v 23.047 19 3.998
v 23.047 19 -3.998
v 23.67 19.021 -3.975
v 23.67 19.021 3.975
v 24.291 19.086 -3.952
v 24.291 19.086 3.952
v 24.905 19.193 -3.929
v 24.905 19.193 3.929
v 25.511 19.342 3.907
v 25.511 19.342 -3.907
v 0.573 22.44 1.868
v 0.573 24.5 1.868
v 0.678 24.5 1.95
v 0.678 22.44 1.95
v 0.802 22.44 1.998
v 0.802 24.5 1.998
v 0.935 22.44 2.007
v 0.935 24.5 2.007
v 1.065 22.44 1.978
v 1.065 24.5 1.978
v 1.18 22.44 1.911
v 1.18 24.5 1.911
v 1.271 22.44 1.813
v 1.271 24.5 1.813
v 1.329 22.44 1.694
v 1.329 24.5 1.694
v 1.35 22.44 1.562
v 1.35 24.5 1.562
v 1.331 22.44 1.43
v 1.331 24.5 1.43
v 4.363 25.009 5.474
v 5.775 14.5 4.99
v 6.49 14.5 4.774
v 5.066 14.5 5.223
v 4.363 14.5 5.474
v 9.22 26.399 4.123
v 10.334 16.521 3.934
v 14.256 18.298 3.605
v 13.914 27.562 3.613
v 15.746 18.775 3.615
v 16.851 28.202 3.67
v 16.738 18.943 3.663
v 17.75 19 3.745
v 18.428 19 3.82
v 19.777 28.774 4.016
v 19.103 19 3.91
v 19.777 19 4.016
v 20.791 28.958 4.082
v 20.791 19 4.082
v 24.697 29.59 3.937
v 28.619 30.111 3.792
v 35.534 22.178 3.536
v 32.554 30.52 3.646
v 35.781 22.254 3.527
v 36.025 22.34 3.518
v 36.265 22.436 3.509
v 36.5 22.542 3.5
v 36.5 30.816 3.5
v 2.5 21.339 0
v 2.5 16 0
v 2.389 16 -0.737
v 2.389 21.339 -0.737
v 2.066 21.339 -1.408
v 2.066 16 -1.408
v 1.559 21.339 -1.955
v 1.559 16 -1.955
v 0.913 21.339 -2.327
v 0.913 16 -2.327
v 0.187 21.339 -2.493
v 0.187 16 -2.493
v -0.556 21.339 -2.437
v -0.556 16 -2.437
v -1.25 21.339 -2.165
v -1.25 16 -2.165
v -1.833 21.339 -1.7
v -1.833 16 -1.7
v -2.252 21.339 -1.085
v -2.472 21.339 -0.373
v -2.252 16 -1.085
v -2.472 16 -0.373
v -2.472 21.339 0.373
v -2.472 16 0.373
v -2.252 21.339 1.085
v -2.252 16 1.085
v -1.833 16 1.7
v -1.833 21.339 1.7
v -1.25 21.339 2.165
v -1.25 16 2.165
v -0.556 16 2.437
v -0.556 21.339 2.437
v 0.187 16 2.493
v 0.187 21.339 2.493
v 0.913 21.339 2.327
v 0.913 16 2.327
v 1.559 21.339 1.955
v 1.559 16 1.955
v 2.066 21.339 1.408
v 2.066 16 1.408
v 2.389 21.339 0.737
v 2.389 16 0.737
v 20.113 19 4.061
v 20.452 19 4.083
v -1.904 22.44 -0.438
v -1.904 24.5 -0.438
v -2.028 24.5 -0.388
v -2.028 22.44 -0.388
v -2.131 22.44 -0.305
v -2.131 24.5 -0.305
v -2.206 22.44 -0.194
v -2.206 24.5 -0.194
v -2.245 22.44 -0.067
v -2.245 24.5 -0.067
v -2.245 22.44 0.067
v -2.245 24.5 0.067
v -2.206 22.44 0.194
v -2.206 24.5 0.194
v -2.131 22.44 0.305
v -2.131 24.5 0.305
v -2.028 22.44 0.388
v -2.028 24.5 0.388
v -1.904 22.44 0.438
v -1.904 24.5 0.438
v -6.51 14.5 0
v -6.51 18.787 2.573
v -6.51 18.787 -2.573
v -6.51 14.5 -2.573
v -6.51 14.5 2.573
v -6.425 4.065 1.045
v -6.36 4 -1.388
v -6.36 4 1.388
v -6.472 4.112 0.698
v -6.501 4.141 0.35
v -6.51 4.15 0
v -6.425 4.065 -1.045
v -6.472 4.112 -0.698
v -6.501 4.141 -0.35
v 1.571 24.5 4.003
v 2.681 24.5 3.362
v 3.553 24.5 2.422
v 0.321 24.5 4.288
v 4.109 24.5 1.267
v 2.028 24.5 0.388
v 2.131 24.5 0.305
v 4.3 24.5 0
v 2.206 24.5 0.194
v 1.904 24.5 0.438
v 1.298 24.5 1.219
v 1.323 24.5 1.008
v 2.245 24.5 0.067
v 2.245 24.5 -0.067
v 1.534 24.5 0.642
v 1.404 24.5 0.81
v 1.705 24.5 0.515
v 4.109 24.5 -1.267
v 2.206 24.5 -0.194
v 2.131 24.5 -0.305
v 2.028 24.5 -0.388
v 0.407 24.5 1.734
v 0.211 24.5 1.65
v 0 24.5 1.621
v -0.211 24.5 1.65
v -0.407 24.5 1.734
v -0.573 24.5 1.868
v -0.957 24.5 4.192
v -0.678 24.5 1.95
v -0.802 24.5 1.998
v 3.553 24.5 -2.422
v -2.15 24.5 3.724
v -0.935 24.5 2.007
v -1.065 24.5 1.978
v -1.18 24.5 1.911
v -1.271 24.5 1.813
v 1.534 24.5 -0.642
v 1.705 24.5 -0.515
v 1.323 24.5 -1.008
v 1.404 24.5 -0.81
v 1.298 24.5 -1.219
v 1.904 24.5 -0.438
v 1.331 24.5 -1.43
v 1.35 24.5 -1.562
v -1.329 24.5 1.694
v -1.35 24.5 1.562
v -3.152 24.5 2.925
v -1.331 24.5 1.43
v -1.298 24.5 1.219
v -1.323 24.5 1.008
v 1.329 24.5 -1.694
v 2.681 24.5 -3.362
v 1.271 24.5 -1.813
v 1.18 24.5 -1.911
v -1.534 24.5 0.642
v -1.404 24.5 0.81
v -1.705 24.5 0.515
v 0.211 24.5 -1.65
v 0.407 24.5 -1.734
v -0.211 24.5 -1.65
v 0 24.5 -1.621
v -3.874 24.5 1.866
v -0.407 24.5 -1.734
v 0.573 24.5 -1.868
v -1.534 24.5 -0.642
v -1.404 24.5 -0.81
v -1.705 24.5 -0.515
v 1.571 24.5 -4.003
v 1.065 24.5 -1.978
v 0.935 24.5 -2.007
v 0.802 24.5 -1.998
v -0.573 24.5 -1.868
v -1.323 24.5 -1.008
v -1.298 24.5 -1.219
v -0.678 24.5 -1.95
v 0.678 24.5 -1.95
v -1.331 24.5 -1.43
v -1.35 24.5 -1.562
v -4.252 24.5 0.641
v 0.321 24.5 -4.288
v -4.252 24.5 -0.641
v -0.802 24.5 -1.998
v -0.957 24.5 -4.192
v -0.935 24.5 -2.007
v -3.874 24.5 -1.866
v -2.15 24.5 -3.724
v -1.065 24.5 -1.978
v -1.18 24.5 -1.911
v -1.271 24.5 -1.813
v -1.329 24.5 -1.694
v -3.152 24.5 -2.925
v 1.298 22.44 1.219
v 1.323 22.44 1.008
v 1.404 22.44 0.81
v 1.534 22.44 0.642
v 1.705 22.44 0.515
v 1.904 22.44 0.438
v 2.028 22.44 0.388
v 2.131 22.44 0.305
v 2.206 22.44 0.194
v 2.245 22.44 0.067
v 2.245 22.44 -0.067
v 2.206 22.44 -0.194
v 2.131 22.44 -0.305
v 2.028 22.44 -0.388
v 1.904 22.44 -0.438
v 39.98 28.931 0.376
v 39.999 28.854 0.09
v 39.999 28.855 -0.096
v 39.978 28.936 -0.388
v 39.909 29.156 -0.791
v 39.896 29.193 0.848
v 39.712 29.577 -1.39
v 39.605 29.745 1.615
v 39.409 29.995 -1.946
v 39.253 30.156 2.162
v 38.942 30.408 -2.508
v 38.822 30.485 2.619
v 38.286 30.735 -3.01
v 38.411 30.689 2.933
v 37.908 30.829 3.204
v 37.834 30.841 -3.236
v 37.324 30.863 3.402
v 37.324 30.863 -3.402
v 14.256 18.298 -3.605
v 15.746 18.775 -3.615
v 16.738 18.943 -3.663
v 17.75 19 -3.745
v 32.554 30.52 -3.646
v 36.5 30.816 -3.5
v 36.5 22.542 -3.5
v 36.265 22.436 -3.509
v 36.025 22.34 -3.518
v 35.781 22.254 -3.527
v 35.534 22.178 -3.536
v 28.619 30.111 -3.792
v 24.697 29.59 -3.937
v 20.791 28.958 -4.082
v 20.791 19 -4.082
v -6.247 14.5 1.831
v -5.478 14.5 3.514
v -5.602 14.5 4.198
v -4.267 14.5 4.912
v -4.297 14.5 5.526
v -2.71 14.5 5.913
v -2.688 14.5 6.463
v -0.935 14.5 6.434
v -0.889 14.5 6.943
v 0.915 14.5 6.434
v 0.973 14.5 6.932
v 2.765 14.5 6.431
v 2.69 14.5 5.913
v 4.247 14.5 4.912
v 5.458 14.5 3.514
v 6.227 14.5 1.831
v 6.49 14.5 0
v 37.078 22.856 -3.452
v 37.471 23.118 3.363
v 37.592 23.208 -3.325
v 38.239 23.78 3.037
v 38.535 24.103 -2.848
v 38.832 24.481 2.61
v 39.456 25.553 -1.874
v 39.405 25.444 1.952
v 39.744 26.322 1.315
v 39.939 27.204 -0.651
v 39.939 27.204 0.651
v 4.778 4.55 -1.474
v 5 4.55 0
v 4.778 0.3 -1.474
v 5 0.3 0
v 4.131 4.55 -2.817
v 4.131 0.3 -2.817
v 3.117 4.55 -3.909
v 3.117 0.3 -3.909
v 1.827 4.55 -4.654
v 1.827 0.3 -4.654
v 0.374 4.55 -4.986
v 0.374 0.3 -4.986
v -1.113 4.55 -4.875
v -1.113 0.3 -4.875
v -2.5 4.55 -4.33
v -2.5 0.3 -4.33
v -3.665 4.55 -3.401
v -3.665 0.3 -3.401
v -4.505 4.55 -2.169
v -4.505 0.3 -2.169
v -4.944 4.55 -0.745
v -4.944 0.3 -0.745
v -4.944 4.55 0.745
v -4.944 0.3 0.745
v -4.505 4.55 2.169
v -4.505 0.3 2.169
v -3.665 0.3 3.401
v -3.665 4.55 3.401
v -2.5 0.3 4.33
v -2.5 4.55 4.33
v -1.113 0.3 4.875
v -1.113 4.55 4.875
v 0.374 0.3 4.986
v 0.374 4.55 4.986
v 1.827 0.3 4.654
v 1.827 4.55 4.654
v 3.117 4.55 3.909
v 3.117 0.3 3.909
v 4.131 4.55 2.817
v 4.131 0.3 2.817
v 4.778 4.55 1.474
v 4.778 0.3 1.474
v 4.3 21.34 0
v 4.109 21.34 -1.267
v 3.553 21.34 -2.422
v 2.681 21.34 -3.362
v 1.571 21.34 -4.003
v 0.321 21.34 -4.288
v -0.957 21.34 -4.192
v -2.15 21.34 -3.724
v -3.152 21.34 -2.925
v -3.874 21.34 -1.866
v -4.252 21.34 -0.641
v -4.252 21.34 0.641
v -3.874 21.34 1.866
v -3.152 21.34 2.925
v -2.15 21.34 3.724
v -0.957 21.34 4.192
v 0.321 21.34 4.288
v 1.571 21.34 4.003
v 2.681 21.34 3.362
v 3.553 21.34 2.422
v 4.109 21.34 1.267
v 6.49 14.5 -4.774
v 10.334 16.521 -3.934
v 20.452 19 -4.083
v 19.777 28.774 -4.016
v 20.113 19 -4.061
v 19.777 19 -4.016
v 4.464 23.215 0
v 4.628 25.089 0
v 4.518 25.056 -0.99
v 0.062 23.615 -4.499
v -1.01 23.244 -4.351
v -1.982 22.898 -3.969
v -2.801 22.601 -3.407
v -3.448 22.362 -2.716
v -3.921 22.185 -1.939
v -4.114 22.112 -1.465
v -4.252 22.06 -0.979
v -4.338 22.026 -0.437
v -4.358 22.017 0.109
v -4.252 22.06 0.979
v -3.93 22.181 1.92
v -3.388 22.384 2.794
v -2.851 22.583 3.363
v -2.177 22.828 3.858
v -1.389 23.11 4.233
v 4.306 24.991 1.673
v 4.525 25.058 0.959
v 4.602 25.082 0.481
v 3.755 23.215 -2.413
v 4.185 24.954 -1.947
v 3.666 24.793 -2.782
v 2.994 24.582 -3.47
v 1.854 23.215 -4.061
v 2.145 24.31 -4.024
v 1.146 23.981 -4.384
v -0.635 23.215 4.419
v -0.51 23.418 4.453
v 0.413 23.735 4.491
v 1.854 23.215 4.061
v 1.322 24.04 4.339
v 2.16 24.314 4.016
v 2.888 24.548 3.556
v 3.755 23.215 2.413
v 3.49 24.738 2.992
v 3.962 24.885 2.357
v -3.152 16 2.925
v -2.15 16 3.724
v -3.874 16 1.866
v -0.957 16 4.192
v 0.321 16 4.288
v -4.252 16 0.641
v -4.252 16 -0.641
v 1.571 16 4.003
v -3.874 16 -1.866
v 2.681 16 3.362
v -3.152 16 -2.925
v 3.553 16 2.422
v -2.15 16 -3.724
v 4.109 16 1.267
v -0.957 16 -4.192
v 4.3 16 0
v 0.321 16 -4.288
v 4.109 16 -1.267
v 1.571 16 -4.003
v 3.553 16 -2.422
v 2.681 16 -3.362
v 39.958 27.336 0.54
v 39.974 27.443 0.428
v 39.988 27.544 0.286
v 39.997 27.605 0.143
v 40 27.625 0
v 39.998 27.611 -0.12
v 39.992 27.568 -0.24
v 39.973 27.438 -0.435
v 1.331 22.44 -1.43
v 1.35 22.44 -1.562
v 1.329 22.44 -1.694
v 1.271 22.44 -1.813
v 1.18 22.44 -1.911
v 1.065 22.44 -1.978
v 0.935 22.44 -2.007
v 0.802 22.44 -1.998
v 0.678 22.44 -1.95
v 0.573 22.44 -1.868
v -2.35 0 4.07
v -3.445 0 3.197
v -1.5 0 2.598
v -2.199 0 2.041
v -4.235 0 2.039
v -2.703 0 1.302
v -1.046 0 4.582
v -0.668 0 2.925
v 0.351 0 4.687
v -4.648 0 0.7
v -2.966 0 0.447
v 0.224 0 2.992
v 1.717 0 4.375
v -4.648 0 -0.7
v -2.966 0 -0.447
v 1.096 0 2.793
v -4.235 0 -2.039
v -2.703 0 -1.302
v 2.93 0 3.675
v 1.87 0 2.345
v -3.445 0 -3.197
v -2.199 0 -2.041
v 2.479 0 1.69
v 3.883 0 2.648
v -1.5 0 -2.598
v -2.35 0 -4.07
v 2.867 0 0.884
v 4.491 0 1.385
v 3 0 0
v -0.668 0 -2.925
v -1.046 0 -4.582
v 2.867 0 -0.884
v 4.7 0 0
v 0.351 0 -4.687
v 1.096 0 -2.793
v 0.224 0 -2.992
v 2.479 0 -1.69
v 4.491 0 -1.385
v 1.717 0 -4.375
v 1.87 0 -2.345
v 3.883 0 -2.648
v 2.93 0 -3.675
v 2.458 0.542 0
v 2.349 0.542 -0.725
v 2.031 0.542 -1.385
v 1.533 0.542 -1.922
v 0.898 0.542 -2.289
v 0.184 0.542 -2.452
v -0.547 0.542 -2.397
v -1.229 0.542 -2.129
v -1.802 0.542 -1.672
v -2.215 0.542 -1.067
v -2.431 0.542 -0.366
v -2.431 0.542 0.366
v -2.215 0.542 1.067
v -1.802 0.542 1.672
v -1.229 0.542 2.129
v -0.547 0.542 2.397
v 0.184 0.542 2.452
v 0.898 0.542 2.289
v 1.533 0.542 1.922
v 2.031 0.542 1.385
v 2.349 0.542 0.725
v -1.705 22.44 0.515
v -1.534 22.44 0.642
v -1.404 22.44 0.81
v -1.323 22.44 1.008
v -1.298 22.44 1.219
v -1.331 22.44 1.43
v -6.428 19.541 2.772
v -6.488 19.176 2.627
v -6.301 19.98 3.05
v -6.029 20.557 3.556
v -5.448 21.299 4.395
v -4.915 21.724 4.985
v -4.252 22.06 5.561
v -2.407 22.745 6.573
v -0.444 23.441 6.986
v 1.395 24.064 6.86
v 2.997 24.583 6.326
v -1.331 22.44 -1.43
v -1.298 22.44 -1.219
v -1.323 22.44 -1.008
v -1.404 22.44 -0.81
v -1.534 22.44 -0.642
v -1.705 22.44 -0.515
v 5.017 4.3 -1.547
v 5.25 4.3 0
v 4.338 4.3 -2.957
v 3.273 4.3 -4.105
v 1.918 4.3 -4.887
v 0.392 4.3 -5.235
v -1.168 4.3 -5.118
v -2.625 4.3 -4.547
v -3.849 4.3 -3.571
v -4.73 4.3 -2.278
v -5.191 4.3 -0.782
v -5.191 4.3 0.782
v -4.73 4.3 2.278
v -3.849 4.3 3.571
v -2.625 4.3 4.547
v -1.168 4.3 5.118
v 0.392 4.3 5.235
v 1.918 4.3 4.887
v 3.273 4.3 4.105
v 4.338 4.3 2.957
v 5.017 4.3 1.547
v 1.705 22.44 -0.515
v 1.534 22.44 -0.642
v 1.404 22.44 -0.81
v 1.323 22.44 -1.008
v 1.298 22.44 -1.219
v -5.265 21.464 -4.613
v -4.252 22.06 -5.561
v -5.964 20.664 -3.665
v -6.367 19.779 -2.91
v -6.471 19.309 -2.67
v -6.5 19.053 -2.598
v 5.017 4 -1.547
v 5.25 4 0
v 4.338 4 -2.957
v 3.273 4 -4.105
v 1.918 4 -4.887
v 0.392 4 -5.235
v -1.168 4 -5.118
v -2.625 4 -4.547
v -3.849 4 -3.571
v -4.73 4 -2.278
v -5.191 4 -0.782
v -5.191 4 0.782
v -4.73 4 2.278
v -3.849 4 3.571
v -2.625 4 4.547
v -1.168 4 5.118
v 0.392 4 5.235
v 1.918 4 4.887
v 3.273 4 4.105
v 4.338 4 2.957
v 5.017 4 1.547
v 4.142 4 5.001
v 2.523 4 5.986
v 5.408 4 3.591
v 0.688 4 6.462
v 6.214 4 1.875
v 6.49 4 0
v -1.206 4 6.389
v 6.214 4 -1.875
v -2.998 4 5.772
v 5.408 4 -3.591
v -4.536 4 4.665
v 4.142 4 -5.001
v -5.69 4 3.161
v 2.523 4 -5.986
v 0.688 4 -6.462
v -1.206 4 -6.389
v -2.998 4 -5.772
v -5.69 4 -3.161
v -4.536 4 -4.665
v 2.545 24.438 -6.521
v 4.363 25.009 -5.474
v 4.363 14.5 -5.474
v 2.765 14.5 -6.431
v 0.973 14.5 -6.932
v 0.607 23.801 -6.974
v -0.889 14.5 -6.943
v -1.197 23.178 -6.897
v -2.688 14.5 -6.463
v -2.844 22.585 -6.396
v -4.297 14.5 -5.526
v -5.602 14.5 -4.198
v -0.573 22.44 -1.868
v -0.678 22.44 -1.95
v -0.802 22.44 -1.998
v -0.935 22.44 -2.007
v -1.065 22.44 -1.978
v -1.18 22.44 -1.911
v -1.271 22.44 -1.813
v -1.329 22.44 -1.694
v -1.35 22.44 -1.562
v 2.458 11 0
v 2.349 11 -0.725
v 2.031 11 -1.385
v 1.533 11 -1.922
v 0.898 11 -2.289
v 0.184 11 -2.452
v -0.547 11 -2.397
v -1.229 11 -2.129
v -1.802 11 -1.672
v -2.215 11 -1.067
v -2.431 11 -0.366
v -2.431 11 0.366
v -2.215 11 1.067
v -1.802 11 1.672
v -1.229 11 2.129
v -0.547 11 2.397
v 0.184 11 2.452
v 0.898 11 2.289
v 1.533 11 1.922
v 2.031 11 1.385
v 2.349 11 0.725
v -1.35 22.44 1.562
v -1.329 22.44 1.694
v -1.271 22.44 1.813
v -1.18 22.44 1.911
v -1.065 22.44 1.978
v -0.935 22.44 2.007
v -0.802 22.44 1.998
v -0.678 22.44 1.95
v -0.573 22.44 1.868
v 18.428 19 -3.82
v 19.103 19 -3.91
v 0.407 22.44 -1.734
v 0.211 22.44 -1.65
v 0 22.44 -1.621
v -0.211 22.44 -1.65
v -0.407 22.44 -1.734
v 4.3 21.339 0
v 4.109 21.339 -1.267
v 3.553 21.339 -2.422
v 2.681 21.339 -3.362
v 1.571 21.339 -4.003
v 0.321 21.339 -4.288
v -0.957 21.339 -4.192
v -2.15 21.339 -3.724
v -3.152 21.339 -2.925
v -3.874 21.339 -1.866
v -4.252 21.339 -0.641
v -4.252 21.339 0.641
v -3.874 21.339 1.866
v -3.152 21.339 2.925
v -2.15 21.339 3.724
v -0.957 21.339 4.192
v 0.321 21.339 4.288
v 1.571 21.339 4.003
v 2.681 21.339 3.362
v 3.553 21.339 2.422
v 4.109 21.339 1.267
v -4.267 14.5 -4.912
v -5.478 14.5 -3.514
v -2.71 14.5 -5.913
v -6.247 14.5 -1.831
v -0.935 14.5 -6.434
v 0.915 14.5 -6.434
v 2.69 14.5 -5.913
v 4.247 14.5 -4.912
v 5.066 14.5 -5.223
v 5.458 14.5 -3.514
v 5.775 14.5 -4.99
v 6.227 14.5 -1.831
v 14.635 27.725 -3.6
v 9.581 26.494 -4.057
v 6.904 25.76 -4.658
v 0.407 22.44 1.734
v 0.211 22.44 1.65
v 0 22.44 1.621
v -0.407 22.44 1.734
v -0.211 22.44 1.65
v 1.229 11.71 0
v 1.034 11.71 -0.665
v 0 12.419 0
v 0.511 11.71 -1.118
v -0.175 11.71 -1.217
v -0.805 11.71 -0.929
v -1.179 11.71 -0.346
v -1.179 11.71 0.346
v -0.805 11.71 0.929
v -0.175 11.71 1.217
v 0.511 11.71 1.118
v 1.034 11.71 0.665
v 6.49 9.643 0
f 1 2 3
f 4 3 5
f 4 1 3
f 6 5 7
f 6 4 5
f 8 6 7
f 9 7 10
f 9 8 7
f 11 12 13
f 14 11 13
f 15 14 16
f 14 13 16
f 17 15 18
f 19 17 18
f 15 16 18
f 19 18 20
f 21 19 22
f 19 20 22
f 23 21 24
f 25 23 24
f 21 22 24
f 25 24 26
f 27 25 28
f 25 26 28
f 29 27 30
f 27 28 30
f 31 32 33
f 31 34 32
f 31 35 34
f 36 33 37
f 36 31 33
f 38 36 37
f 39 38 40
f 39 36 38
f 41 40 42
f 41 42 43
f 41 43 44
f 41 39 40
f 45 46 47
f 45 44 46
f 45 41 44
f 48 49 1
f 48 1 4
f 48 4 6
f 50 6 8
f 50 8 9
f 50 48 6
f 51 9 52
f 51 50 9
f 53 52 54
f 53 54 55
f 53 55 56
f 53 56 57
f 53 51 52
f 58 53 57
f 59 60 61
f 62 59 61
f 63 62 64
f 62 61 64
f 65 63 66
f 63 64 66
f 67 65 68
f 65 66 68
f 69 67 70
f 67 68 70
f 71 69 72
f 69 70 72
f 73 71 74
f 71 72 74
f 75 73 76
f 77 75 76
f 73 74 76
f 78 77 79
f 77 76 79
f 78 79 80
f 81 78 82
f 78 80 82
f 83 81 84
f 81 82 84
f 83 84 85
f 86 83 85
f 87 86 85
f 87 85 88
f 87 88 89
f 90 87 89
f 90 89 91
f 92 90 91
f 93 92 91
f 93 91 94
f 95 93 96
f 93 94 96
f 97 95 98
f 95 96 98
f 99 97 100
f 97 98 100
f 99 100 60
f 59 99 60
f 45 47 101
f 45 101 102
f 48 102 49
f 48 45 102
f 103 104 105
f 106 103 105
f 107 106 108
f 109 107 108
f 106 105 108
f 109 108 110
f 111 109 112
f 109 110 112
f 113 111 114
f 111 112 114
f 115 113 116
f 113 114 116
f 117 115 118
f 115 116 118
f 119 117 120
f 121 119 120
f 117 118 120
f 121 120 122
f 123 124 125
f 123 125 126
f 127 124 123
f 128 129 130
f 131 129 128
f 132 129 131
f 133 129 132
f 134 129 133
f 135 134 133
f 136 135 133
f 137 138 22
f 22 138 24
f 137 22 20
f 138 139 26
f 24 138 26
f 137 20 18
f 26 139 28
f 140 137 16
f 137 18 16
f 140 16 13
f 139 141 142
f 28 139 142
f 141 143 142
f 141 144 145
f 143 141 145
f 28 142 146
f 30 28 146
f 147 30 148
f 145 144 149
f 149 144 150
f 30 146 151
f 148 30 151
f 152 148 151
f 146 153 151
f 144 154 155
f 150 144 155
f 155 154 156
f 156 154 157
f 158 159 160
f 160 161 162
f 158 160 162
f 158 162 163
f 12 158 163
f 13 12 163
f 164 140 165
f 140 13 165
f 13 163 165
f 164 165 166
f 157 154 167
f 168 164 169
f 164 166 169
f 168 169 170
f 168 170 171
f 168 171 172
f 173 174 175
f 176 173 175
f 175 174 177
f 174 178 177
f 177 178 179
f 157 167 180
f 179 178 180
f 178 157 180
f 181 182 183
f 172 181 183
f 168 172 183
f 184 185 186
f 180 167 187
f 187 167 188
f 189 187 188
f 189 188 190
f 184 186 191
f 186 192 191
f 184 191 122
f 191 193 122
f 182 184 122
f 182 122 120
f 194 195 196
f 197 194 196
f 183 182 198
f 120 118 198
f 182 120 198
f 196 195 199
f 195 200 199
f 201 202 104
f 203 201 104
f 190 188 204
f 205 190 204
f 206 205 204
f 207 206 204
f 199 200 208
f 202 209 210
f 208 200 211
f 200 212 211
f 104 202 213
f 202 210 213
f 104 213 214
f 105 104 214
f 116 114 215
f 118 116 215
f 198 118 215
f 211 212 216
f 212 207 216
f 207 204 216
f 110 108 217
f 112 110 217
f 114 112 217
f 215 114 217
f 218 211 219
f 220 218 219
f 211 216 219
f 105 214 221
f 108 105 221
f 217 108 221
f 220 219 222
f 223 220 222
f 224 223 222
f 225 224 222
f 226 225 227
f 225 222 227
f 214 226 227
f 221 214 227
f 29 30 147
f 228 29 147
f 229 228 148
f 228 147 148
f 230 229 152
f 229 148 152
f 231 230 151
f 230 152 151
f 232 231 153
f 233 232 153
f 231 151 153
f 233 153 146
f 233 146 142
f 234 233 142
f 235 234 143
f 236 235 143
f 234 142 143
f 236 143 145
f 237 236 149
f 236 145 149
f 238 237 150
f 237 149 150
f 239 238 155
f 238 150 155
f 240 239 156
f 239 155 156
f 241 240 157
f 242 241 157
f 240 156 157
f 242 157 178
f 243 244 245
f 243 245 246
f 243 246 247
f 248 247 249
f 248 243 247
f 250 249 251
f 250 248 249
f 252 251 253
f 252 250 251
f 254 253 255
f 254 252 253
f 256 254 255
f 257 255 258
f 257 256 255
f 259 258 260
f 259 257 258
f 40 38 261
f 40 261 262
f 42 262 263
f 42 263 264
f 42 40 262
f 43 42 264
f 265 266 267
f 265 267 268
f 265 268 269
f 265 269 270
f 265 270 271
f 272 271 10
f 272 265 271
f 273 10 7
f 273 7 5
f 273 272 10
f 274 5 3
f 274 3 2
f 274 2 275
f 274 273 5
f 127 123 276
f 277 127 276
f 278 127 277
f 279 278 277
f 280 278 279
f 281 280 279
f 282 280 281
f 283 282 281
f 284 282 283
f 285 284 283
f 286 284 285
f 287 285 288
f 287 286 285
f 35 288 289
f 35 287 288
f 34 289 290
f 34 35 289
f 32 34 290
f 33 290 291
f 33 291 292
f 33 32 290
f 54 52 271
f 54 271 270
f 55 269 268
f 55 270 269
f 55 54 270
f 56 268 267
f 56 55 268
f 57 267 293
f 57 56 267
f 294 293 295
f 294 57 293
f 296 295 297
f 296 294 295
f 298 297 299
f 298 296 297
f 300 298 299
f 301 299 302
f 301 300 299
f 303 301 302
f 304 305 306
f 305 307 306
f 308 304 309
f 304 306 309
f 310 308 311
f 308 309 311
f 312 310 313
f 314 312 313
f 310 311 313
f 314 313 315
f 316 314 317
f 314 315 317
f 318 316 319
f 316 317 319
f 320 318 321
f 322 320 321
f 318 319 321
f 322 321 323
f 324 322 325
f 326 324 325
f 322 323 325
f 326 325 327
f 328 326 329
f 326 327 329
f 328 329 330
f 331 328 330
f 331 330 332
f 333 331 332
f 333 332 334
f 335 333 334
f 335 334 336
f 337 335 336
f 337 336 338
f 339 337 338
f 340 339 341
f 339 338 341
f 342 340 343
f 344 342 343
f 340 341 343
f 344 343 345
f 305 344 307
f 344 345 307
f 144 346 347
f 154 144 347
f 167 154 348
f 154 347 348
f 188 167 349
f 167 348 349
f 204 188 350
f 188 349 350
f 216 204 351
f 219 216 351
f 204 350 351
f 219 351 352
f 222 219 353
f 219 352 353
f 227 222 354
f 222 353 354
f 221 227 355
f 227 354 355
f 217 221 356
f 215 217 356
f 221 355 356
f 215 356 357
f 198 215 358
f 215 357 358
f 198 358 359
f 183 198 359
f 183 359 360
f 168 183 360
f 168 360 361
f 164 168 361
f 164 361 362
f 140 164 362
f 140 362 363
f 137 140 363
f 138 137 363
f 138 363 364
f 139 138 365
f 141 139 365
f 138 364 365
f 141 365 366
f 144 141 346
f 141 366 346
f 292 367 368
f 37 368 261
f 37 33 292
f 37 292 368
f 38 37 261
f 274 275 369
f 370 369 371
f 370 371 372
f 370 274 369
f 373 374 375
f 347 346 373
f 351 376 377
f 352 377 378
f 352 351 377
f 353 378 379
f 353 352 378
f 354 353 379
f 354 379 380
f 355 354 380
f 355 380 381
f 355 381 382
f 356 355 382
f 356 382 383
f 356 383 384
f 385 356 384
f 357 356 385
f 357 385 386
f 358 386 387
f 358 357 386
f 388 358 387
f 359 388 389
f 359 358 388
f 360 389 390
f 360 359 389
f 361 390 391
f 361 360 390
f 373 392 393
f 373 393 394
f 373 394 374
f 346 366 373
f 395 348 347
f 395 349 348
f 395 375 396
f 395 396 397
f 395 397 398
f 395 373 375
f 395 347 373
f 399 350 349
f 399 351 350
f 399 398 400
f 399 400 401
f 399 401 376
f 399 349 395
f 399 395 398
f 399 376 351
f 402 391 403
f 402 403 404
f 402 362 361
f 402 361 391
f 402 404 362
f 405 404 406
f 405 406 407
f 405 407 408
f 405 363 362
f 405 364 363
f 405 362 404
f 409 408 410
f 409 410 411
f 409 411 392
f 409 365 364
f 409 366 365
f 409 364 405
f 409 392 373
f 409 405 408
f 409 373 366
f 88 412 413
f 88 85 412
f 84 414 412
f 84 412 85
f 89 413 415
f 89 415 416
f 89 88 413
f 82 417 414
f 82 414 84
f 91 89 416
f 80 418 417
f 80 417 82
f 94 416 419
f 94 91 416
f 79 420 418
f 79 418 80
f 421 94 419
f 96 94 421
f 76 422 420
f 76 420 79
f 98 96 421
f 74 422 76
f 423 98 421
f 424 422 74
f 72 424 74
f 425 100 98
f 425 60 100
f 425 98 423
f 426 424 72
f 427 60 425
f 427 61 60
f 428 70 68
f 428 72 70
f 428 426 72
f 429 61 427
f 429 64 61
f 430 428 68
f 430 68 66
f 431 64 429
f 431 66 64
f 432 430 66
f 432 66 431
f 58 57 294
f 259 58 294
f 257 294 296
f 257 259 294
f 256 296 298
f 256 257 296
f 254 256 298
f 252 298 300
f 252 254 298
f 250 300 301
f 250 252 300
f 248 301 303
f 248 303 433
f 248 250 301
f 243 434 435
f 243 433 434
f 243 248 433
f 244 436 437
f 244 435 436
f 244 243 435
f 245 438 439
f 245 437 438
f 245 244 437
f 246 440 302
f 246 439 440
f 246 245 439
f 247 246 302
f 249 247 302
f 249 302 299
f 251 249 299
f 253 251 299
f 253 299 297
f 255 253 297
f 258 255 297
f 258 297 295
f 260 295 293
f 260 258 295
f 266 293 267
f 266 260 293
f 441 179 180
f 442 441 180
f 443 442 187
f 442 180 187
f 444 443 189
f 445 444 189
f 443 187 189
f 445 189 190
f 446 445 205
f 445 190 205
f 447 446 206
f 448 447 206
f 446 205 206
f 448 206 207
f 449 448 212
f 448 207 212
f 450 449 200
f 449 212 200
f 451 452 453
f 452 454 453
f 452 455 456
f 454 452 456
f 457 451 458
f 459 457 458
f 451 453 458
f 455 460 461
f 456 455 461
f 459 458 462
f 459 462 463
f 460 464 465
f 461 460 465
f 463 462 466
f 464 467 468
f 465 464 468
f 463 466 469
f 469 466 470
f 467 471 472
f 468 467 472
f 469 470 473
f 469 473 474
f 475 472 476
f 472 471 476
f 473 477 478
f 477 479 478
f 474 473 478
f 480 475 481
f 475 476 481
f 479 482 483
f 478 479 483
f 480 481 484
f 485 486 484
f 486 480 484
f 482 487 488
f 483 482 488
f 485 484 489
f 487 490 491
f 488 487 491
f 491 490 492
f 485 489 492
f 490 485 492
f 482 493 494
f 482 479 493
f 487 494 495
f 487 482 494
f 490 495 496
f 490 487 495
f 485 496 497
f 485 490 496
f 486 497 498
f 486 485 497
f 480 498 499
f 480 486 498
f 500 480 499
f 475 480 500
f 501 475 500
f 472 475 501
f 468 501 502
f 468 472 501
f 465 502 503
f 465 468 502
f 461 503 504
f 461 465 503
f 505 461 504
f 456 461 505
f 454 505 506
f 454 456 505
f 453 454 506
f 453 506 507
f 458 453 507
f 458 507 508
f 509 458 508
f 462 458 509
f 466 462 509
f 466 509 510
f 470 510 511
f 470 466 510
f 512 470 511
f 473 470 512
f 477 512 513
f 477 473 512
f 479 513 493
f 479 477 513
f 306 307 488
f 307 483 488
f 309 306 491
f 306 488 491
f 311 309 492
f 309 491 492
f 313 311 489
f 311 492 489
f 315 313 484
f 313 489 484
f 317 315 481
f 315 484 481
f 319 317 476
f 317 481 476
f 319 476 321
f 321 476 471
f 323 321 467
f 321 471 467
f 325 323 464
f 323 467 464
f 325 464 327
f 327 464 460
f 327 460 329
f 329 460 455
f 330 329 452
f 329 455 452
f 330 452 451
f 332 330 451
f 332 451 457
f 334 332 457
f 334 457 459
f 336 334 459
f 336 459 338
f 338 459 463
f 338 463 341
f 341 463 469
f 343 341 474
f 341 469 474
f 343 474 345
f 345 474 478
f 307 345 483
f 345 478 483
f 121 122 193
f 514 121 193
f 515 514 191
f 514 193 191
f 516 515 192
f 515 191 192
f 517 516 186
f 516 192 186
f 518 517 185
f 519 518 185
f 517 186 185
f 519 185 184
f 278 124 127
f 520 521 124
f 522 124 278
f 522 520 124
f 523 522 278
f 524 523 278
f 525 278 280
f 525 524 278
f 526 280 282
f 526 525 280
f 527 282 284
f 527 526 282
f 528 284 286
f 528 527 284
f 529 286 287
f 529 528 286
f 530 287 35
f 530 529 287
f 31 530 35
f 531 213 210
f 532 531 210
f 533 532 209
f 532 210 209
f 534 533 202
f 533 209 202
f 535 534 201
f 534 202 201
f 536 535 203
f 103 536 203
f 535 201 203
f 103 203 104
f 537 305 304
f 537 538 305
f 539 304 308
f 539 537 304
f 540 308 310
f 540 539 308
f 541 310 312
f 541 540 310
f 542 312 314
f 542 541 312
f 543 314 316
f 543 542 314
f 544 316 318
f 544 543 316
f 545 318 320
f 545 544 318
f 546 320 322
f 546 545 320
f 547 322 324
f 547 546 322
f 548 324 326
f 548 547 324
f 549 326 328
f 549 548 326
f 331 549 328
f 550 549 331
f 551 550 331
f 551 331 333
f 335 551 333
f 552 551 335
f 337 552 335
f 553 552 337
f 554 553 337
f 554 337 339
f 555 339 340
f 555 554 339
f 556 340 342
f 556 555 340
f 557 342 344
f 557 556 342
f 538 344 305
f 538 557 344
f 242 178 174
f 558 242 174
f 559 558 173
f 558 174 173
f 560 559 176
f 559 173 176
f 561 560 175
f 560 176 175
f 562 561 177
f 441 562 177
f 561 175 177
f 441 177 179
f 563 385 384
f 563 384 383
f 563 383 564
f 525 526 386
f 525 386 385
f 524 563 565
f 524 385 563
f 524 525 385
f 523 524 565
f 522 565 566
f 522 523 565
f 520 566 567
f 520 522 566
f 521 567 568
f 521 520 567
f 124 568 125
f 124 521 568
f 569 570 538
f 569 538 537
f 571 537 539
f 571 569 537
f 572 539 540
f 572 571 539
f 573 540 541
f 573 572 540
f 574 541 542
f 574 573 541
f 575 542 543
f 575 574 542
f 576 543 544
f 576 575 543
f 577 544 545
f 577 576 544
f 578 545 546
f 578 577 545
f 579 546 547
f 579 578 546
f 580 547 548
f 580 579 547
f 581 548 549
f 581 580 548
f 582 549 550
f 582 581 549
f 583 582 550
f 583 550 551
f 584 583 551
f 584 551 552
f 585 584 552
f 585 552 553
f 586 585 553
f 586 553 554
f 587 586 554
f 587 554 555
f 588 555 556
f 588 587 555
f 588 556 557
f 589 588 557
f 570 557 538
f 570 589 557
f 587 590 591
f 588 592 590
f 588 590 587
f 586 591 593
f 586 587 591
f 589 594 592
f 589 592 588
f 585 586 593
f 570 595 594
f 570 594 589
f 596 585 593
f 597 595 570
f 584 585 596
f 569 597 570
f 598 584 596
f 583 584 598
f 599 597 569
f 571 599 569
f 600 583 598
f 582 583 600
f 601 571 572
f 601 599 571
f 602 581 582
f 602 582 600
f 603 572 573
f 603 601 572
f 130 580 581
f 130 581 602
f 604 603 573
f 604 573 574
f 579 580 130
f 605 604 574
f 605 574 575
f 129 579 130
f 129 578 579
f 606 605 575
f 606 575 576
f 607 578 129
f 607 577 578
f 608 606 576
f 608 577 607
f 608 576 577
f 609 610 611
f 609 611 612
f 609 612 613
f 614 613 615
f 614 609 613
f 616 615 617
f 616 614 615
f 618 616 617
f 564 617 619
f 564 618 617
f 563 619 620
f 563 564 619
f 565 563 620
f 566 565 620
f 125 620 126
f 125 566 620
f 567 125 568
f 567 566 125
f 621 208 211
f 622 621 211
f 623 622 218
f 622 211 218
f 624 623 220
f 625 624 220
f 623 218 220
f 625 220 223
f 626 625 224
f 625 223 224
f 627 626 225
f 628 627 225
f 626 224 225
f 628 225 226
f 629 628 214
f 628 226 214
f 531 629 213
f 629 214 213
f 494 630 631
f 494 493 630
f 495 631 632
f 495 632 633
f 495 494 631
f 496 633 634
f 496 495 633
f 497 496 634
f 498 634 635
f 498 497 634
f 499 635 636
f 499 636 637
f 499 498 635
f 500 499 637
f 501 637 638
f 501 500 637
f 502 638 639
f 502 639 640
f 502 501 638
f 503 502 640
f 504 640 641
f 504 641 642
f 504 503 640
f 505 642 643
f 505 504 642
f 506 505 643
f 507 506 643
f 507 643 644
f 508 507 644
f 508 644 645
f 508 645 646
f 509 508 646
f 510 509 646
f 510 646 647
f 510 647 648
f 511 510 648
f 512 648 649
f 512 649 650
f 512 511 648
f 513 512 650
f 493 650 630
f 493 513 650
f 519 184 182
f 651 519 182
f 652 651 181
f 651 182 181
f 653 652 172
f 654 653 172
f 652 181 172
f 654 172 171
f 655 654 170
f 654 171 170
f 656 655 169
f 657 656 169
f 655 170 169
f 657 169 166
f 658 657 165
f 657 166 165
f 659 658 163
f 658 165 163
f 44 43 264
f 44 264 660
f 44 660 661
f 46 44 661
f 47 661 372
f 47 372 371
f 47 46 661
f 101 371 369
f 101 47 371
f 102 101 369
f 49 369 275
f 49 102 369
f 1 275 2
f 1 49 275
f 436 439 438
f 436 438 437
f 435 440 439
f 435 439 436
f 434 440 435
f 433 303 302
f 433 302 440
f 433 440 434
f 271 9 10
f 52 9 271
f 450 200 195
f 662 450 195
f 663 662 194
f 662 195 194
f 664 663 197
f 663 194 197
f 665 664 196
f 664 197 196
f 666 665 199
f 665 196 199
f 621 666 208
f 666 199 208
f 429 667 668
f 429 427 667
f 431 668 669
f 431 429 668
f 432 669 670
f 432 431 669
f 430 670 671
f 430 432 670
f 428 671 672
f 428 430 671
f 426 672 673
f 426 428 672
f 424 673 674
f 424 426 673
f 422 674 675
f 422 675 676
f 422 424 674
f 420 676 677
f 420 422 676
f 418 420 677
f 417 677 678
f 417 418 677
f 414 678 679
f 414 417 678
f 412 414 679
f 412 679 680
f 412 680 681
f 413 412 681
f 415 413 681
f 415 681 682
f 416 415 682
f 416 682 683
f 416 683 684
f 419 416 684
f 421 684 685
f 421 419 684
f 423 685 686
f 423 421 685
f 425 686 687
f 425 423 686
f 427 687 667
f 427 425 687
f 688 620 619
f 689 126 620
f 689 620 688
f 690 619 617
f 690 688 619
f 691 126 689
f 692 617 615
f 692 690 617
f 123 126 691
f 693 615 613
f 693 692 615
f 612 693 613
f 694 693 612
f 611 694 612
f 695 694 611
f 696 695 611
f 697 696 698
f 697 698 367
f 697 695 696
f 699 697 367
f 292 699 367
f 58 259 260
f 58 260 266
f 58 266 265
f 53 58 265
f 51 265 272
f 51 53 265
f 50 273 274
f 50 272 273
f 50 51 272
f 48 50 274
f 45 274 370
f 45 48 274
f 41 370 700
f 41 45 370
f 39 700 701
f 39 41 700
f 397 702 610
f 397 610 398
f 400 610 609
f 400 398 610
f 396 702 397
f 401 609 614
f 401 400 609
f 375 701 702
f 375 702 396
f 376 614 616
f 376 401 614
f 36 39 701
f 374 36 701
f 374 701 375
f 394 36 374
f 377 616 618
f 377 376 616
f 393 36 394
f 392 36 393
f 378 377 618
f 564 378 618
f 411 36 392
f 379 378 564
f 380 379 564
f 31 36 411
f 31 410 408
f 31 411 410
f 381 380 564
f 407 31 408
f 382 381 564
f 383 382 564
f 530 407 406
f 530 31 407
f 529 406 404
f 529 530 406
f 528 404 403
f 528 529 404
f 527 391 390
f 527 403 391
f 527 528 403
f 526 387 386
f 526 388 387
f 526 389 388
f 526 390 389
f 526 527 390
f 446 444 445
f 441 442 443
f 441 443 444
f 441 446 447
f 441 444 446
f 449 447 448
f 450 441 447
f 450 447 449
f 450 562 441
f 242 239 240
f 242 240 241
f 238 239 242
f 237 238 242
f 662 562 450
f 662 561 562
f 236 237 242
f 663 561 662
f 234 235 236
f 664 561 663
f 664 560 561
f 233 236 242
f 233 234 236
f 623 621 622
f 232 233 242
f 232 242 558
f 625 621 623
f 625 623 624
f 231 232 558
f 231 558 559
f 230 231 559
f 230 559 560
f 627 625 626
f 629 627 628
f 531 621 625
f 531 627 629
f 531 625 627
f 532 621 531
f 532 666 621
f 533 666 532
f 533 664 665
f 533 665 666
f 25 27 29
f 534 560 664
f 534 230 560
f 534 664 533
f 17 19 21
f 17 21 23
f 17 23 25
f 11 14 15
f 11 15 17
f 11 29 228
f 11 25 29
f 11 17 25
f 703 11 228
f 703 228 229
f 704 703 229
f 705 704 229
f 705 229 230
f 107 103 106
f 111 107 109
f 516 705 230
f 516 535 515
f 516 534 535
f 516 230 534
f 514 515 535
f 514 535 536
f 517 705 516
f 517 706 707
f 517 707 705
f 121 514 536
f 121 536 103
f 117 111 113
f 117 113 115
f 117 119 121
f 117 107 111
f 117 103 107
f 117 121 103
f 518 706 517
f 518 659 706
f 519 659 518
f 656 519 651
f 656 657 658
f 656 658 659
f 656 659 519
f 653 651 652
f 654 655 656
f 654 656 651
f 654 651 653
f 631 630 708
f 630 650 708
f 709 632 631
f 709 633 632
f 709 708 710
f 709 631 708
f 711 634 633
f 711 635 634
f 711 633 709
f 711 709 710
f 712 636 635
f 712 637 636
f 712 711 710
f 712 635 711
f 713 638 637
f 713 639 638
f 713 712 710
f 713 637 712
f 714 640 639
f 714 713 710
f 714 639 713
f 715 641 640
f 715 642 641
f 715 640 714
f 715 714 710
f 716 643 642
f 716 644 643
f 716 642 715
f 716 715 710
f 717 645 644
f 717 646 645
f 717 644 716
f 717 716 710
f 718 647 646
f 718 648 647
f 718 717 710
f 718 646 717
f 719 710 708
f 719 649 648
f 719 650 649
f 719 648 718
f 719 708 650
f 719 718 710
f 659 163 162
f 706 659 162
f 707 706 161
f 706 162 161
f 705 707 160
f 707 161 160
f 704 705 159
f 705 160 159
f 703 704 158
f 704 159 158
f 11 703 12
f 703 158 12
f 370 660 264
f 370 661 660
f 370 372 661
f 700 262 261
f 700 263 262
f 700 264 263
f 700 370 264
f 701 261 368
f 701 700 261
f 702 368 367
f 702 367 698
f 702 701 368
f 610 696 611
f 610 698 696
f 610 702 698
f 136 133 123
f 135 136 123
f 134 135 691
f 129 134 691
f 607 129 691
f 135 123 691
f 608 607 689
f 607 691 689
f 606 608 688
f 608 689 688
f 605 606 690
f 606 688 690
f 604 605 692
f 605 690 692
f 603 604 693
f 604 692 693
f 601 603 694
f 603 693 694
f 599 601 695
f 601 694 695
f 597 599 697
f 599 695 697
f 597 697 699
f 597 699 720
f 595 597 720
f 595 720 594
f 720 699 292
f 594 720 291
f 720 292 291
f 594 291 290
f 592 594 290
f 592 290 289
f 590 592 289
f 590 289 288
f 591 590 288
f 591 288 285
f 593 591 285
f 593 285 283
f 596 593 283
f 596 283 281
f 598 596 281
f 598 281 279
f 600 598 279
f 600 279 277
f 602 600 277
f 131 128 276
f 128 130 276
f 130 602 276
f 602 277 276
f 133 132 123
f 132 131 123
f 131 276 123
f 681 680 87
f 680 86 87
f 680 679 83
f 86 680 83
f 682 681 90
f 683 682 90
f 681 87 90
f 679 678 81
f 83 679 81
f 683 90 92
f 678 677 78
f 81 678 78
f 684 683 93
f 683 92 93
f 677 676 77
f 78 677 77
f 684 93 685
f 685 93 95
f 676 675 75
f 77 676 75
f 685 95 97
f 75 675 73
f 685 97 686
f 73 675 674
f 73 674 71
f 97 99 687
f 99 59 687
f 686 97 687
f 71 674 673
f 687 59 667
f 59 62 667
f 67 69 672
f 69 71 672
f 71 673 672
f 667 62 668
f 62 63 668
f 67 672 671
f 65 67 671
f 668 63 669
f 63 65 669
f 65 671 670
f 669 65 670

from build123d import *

# Parameters (mm, degrees)
EXTRUDE1_DEPTH      = 8
EXTRUDE1_DEPTH_BACK = 8
SKETCH2_W           = 6.5
SKETCH2_H           = 12.5625
SKETCH3_W           = 94
SKETCH3_H           = 94
EXTRUDE2_DEPTH      = 31
EXTRUDE3_DEPTH      = 14
EXTRUDE3_DEPTH_BACK = 14
SKETCH4_W           = 94
SKETCH4_H           = 47
EXTRUDE4_DEPTH      = 2.06
EXTRUDE4_DEPTH_BACK = 2.06


with BuildPart() as part:
    # Sketch1 → Extrude1 (new, two sides: drawn at the far end of the back side and taken through both)
    with BuildSketch(Plane.XY.offset(-EXTRUDE1_DEPTH_BACK)):
        with BuildLine():
            Line((-6.51, 14.5), (6.49, 14.5))
            ThreePointArc((6.49, 14.5), (10.317505243, 16.512584876), (14.256035557, 18.29815852))
            ThreePointArc((14.256035557, 18.29815852), (15.968337207, 18.822804929), (17.75042382, 19))
            Line((17.75042382, 19), (23.046668584, 19))
            ThreePointArc((23.046668584, 19), (24.290541726, 19.085889358), (25.51080482, 19.341927159))
            Line((25.51080482, 19.341927159), (35.534460964, 22.178335945))
            ThreePointArc((35.534460964, 22.178335945), (38.480369536, 24.039582758), (39.938965898, 27.204249197))
            Line((39.938965898, 27.204249197), (40.03902701, 27.893511518))
            ThreePointArc((40.03902701, 27.893511518), (39.384905735, 30.021406047), (37.324018346, 30.863161913))
            ThreePointArc((37.324018346, 30.863161913), (16.196447137, 28.065543342), (-4.25177913, 22.059631473))
            ThreePointArc((-4.25177913, 22.059631473), (-5.890644629, 20.775261015), (-6.51, 18.787325774))
            Line((-6.51, 18.787325774), (-6.51, 14.5))
        make_face()
    extrude(amount=EXTRUDE1_DEPTH + EXTRUDE1_DEPTH_BACK)

    # Sketch2 → Revolve1 (revolve)
    with BuildSketch(Plane.XY):
        with Locations((-3.26, 10.28125)):
            Rectangle(SKETCH2_W, SKETCH2_H)
    revolve(axis=Axis((-0.01, 16.5625, 0), (0, -1, 0)))

    # Sketch3 → Extrude2 (cut)
    with BuildSketch(Plane(origin=(0, 31, 0), x_dir=(-1, 0, 0), z_dir=(0, 1, 0))):
        with Locations((-7, -7)):
            Rectangle(SKETCH3_W, SKETCH3_H)
        with BuildLine():
            Line((-20.791020756, 4.081513031), (-36.5, 3.5))
            ThreePointArc((-36.5, 3.5), (-40, 0), (-36.5, -3.5))
            Line((-36.5, -3.5), (-20.791020756, -4.081513031))
            ThreePointArc((-20.791020756, -4.081513031), (-20.282143055, -4.074432197), (-19.7766212, -4.015658847))
            ThreePointArc((-19.7766212, -4.015658847), (-11.97399514, -3.733401658), (-4.362785826, -5.474130053))
            ThreePointArc((-4.362785826, -5.474130053), (7, 0), (-4.362785826, 5.474130053))
            ThreePointArc((-4.362785826, 5.474130053), (-11.97399514, 3.733401658), (-19.7766212, 4.015658847))
            ThreePointArc((-19.7766212, 4.015658847), (-20.282143055, 4.074432197), (-20.791020756, 4.081513031))
        make_face(mode=Mode.SUBTRACT)
    extrude(amount=-EXTRUDE2_DEPTH, mode=Mode.SUBTRACT)

    # Sketch4 → Extrude3 (cut, two sides: drawn at the far end of the back side and taken through both)
    with BuildSketch(Plane.XY.offset(-EXTRUDE3_DEPTH_BACK)):
        with Locations((7, 23.5)):
            Rectangle(SKETCH4_W, SKETCH4_H)
        with BuildLine():
            Line((-6.51, 18.787325774), (-6.51, 4.149977348))
            Line((-6.51, 4.149977348), (-6.360022652, 4))
            Line((-6.360022652, 4), (6.49, 4))
            Line((6.49, 4), (6.49, 9.643220966))
            ThreePointArc((6.49, 9.643220966), (7.726858035, 13.916382648), (11.05497769, 16.868220739))
            ThreePointArc((11.05497769, 16.868220739), (12.647037105, 17.602149488), (14.256035557, 18.29815852))
            ThreePointArc((14.256035557, 18.29815852), (15.968337207, 18.822804929), (17.75042382, 19))
            Line((17.75042382, 19), (23.046668584, 19))
            ThreePointArc((23.046668584, 19), (24.290541726, 19.085889358), (25.51080482, 19.341927159))
            Line((25.51080482, 19.341927159), (35.534460964, 22.178335945))
            ThreePointArc((35.534460964, 22.178335945), (38.480369536, 24.039582758), (39.938965898, 27.204249197))
            Line((39.938965898, 27.204249197), (40.03902701, 27.893511518))
            ThreePointArc((40.03902701, 27.893511518), (39.384905735, 30.021406047), (37.324018346, 30.863161913))
            ThreePointArc((37.324018346, 30.863161913), (16.196447137, 28.065543342), (-4.25177913, 22.059631473))
            ThreePointArc((-4.25177913, 22.059631473), (-5.890644629, 20.775261015), (-6.51, 18.787325774))
        make_face(mode=Mode.SUBTRACT)
    extrude(amount=EXTRUDE3_DEPTH + EXTRUDE3_DEPTH_BACK, mode=Mode.SUBTRACT)

    # Sketch5 → Cut-Revolve1 (revolve, cut)
    with BuildSketch(Plane.XY):
        Polygon((0, 28.5), (4.926418831, 28.5), (4.3, 21.34), (4.3, 16), (2.5, 16), (2.5, 15), (4.15, 15), (4.15, 12.8), (5, 12.8), (5, 4.55), (5.25, 4.3), (5.25, 3), (0, 3), align=None)
    revolve(axis=Axis((0, 4, 0), (0, 1, 0)), mode=Mode.SUBTRACT)

    # Sketch6 → Revolve2 (revolve)
    with BuildSketch(Plane.XY):
        Polygon((0, 24.5), (4.3, 24.5), (4.3, 21.339), (2.5, 21.339), (2.5, 15), (4.15, 15), (4.15, 12.8), (5, 12.8), (5, 0.3), (4.7, 0), (0, 0), align=None)
    revolve(axis=Axis((0, 0, 0), (0, 1, 0)))

    # Sketch7 → Extrude4 (cut, two sides: drawn at the far end of the back side and taken through both)
    with BuildSketch(Plane(origin=(0, 24.5, 0), x_dir=(-1, 0, 0), z_dir=(0, 1, 0)).offset(-EXTRUDE4_DEPTH_BACK)):
        with BuildLine():
            ThreePointArc((1.903841526, -0.437854927), (2.25, 0), (1.903841526, 0.437854927))
            ThreePointArc((1.903841526, 0.437854927), (1.403569191, 0.81035105), (1.331114253, 1.429847663))
            ThreePointArc((1.331114253, 1.429847663), (1.125, 1.948557159), (0.572727273, 1.86770259))
            ThreePointArc((0.572727273, 1.86770259), (0, 1.620702101), (-0.572727273, 1.86770259))
            ThreePointArc((-0.572727273, 1.86770259), (-1.125, 1.948557159), (-1.331114253, 1.429847663))
            ThreePointArc((-1.331114253, 1.429847663), (-1.403569191, 0.81035105), (-1.903841526, 0.437854927))
            ThreePointArc((-1.903841526, 0.437854927), (-2.25, 0), (-1.903841526, -0.437854927))
            ThreePointArc((-1.903841526, -0.437854927), (-1.403569191, -0.81035105), (-1.331114253, -1.429847663))
            ThreePointArc((-1.331114253, -1.429847663), (-1.125, -1.948557159), (-0.572727273, -1.86770259))
            ThreePointArc((-0.572727273, -1.86770259), (0, -1.620702101), (0.572727273, -1.86770259))
            ThreePointArc((0.572727273, -1.86770259), (1.125, -1.948557159), (1.331114253, -1.429847663))
            ThreePointArc((1.331114253, -1.429847663), (1.403569191, -0.81035105), (1.903841526, -0.437854927))
        make_face()
    extrude(amount=EXTRUDE4_DEPTH + EXTRUDE4_DEPTH_BACK, mode=Mode.SUBTRACT)

    # Sketch8 → Cut-Revolve2 (revolve, cut)
    with BuildSketch(Plane.XY):
        Polygon((0, 12.419415637), (2.4585, 11), (2.4585, 0.5415), (3, 0), (0, 0), align=None)
    revolve(axis=Axis((0, 0, 0), (0, 1, 0)), mode=Mode.SUBTRACT)


solid = part.part
